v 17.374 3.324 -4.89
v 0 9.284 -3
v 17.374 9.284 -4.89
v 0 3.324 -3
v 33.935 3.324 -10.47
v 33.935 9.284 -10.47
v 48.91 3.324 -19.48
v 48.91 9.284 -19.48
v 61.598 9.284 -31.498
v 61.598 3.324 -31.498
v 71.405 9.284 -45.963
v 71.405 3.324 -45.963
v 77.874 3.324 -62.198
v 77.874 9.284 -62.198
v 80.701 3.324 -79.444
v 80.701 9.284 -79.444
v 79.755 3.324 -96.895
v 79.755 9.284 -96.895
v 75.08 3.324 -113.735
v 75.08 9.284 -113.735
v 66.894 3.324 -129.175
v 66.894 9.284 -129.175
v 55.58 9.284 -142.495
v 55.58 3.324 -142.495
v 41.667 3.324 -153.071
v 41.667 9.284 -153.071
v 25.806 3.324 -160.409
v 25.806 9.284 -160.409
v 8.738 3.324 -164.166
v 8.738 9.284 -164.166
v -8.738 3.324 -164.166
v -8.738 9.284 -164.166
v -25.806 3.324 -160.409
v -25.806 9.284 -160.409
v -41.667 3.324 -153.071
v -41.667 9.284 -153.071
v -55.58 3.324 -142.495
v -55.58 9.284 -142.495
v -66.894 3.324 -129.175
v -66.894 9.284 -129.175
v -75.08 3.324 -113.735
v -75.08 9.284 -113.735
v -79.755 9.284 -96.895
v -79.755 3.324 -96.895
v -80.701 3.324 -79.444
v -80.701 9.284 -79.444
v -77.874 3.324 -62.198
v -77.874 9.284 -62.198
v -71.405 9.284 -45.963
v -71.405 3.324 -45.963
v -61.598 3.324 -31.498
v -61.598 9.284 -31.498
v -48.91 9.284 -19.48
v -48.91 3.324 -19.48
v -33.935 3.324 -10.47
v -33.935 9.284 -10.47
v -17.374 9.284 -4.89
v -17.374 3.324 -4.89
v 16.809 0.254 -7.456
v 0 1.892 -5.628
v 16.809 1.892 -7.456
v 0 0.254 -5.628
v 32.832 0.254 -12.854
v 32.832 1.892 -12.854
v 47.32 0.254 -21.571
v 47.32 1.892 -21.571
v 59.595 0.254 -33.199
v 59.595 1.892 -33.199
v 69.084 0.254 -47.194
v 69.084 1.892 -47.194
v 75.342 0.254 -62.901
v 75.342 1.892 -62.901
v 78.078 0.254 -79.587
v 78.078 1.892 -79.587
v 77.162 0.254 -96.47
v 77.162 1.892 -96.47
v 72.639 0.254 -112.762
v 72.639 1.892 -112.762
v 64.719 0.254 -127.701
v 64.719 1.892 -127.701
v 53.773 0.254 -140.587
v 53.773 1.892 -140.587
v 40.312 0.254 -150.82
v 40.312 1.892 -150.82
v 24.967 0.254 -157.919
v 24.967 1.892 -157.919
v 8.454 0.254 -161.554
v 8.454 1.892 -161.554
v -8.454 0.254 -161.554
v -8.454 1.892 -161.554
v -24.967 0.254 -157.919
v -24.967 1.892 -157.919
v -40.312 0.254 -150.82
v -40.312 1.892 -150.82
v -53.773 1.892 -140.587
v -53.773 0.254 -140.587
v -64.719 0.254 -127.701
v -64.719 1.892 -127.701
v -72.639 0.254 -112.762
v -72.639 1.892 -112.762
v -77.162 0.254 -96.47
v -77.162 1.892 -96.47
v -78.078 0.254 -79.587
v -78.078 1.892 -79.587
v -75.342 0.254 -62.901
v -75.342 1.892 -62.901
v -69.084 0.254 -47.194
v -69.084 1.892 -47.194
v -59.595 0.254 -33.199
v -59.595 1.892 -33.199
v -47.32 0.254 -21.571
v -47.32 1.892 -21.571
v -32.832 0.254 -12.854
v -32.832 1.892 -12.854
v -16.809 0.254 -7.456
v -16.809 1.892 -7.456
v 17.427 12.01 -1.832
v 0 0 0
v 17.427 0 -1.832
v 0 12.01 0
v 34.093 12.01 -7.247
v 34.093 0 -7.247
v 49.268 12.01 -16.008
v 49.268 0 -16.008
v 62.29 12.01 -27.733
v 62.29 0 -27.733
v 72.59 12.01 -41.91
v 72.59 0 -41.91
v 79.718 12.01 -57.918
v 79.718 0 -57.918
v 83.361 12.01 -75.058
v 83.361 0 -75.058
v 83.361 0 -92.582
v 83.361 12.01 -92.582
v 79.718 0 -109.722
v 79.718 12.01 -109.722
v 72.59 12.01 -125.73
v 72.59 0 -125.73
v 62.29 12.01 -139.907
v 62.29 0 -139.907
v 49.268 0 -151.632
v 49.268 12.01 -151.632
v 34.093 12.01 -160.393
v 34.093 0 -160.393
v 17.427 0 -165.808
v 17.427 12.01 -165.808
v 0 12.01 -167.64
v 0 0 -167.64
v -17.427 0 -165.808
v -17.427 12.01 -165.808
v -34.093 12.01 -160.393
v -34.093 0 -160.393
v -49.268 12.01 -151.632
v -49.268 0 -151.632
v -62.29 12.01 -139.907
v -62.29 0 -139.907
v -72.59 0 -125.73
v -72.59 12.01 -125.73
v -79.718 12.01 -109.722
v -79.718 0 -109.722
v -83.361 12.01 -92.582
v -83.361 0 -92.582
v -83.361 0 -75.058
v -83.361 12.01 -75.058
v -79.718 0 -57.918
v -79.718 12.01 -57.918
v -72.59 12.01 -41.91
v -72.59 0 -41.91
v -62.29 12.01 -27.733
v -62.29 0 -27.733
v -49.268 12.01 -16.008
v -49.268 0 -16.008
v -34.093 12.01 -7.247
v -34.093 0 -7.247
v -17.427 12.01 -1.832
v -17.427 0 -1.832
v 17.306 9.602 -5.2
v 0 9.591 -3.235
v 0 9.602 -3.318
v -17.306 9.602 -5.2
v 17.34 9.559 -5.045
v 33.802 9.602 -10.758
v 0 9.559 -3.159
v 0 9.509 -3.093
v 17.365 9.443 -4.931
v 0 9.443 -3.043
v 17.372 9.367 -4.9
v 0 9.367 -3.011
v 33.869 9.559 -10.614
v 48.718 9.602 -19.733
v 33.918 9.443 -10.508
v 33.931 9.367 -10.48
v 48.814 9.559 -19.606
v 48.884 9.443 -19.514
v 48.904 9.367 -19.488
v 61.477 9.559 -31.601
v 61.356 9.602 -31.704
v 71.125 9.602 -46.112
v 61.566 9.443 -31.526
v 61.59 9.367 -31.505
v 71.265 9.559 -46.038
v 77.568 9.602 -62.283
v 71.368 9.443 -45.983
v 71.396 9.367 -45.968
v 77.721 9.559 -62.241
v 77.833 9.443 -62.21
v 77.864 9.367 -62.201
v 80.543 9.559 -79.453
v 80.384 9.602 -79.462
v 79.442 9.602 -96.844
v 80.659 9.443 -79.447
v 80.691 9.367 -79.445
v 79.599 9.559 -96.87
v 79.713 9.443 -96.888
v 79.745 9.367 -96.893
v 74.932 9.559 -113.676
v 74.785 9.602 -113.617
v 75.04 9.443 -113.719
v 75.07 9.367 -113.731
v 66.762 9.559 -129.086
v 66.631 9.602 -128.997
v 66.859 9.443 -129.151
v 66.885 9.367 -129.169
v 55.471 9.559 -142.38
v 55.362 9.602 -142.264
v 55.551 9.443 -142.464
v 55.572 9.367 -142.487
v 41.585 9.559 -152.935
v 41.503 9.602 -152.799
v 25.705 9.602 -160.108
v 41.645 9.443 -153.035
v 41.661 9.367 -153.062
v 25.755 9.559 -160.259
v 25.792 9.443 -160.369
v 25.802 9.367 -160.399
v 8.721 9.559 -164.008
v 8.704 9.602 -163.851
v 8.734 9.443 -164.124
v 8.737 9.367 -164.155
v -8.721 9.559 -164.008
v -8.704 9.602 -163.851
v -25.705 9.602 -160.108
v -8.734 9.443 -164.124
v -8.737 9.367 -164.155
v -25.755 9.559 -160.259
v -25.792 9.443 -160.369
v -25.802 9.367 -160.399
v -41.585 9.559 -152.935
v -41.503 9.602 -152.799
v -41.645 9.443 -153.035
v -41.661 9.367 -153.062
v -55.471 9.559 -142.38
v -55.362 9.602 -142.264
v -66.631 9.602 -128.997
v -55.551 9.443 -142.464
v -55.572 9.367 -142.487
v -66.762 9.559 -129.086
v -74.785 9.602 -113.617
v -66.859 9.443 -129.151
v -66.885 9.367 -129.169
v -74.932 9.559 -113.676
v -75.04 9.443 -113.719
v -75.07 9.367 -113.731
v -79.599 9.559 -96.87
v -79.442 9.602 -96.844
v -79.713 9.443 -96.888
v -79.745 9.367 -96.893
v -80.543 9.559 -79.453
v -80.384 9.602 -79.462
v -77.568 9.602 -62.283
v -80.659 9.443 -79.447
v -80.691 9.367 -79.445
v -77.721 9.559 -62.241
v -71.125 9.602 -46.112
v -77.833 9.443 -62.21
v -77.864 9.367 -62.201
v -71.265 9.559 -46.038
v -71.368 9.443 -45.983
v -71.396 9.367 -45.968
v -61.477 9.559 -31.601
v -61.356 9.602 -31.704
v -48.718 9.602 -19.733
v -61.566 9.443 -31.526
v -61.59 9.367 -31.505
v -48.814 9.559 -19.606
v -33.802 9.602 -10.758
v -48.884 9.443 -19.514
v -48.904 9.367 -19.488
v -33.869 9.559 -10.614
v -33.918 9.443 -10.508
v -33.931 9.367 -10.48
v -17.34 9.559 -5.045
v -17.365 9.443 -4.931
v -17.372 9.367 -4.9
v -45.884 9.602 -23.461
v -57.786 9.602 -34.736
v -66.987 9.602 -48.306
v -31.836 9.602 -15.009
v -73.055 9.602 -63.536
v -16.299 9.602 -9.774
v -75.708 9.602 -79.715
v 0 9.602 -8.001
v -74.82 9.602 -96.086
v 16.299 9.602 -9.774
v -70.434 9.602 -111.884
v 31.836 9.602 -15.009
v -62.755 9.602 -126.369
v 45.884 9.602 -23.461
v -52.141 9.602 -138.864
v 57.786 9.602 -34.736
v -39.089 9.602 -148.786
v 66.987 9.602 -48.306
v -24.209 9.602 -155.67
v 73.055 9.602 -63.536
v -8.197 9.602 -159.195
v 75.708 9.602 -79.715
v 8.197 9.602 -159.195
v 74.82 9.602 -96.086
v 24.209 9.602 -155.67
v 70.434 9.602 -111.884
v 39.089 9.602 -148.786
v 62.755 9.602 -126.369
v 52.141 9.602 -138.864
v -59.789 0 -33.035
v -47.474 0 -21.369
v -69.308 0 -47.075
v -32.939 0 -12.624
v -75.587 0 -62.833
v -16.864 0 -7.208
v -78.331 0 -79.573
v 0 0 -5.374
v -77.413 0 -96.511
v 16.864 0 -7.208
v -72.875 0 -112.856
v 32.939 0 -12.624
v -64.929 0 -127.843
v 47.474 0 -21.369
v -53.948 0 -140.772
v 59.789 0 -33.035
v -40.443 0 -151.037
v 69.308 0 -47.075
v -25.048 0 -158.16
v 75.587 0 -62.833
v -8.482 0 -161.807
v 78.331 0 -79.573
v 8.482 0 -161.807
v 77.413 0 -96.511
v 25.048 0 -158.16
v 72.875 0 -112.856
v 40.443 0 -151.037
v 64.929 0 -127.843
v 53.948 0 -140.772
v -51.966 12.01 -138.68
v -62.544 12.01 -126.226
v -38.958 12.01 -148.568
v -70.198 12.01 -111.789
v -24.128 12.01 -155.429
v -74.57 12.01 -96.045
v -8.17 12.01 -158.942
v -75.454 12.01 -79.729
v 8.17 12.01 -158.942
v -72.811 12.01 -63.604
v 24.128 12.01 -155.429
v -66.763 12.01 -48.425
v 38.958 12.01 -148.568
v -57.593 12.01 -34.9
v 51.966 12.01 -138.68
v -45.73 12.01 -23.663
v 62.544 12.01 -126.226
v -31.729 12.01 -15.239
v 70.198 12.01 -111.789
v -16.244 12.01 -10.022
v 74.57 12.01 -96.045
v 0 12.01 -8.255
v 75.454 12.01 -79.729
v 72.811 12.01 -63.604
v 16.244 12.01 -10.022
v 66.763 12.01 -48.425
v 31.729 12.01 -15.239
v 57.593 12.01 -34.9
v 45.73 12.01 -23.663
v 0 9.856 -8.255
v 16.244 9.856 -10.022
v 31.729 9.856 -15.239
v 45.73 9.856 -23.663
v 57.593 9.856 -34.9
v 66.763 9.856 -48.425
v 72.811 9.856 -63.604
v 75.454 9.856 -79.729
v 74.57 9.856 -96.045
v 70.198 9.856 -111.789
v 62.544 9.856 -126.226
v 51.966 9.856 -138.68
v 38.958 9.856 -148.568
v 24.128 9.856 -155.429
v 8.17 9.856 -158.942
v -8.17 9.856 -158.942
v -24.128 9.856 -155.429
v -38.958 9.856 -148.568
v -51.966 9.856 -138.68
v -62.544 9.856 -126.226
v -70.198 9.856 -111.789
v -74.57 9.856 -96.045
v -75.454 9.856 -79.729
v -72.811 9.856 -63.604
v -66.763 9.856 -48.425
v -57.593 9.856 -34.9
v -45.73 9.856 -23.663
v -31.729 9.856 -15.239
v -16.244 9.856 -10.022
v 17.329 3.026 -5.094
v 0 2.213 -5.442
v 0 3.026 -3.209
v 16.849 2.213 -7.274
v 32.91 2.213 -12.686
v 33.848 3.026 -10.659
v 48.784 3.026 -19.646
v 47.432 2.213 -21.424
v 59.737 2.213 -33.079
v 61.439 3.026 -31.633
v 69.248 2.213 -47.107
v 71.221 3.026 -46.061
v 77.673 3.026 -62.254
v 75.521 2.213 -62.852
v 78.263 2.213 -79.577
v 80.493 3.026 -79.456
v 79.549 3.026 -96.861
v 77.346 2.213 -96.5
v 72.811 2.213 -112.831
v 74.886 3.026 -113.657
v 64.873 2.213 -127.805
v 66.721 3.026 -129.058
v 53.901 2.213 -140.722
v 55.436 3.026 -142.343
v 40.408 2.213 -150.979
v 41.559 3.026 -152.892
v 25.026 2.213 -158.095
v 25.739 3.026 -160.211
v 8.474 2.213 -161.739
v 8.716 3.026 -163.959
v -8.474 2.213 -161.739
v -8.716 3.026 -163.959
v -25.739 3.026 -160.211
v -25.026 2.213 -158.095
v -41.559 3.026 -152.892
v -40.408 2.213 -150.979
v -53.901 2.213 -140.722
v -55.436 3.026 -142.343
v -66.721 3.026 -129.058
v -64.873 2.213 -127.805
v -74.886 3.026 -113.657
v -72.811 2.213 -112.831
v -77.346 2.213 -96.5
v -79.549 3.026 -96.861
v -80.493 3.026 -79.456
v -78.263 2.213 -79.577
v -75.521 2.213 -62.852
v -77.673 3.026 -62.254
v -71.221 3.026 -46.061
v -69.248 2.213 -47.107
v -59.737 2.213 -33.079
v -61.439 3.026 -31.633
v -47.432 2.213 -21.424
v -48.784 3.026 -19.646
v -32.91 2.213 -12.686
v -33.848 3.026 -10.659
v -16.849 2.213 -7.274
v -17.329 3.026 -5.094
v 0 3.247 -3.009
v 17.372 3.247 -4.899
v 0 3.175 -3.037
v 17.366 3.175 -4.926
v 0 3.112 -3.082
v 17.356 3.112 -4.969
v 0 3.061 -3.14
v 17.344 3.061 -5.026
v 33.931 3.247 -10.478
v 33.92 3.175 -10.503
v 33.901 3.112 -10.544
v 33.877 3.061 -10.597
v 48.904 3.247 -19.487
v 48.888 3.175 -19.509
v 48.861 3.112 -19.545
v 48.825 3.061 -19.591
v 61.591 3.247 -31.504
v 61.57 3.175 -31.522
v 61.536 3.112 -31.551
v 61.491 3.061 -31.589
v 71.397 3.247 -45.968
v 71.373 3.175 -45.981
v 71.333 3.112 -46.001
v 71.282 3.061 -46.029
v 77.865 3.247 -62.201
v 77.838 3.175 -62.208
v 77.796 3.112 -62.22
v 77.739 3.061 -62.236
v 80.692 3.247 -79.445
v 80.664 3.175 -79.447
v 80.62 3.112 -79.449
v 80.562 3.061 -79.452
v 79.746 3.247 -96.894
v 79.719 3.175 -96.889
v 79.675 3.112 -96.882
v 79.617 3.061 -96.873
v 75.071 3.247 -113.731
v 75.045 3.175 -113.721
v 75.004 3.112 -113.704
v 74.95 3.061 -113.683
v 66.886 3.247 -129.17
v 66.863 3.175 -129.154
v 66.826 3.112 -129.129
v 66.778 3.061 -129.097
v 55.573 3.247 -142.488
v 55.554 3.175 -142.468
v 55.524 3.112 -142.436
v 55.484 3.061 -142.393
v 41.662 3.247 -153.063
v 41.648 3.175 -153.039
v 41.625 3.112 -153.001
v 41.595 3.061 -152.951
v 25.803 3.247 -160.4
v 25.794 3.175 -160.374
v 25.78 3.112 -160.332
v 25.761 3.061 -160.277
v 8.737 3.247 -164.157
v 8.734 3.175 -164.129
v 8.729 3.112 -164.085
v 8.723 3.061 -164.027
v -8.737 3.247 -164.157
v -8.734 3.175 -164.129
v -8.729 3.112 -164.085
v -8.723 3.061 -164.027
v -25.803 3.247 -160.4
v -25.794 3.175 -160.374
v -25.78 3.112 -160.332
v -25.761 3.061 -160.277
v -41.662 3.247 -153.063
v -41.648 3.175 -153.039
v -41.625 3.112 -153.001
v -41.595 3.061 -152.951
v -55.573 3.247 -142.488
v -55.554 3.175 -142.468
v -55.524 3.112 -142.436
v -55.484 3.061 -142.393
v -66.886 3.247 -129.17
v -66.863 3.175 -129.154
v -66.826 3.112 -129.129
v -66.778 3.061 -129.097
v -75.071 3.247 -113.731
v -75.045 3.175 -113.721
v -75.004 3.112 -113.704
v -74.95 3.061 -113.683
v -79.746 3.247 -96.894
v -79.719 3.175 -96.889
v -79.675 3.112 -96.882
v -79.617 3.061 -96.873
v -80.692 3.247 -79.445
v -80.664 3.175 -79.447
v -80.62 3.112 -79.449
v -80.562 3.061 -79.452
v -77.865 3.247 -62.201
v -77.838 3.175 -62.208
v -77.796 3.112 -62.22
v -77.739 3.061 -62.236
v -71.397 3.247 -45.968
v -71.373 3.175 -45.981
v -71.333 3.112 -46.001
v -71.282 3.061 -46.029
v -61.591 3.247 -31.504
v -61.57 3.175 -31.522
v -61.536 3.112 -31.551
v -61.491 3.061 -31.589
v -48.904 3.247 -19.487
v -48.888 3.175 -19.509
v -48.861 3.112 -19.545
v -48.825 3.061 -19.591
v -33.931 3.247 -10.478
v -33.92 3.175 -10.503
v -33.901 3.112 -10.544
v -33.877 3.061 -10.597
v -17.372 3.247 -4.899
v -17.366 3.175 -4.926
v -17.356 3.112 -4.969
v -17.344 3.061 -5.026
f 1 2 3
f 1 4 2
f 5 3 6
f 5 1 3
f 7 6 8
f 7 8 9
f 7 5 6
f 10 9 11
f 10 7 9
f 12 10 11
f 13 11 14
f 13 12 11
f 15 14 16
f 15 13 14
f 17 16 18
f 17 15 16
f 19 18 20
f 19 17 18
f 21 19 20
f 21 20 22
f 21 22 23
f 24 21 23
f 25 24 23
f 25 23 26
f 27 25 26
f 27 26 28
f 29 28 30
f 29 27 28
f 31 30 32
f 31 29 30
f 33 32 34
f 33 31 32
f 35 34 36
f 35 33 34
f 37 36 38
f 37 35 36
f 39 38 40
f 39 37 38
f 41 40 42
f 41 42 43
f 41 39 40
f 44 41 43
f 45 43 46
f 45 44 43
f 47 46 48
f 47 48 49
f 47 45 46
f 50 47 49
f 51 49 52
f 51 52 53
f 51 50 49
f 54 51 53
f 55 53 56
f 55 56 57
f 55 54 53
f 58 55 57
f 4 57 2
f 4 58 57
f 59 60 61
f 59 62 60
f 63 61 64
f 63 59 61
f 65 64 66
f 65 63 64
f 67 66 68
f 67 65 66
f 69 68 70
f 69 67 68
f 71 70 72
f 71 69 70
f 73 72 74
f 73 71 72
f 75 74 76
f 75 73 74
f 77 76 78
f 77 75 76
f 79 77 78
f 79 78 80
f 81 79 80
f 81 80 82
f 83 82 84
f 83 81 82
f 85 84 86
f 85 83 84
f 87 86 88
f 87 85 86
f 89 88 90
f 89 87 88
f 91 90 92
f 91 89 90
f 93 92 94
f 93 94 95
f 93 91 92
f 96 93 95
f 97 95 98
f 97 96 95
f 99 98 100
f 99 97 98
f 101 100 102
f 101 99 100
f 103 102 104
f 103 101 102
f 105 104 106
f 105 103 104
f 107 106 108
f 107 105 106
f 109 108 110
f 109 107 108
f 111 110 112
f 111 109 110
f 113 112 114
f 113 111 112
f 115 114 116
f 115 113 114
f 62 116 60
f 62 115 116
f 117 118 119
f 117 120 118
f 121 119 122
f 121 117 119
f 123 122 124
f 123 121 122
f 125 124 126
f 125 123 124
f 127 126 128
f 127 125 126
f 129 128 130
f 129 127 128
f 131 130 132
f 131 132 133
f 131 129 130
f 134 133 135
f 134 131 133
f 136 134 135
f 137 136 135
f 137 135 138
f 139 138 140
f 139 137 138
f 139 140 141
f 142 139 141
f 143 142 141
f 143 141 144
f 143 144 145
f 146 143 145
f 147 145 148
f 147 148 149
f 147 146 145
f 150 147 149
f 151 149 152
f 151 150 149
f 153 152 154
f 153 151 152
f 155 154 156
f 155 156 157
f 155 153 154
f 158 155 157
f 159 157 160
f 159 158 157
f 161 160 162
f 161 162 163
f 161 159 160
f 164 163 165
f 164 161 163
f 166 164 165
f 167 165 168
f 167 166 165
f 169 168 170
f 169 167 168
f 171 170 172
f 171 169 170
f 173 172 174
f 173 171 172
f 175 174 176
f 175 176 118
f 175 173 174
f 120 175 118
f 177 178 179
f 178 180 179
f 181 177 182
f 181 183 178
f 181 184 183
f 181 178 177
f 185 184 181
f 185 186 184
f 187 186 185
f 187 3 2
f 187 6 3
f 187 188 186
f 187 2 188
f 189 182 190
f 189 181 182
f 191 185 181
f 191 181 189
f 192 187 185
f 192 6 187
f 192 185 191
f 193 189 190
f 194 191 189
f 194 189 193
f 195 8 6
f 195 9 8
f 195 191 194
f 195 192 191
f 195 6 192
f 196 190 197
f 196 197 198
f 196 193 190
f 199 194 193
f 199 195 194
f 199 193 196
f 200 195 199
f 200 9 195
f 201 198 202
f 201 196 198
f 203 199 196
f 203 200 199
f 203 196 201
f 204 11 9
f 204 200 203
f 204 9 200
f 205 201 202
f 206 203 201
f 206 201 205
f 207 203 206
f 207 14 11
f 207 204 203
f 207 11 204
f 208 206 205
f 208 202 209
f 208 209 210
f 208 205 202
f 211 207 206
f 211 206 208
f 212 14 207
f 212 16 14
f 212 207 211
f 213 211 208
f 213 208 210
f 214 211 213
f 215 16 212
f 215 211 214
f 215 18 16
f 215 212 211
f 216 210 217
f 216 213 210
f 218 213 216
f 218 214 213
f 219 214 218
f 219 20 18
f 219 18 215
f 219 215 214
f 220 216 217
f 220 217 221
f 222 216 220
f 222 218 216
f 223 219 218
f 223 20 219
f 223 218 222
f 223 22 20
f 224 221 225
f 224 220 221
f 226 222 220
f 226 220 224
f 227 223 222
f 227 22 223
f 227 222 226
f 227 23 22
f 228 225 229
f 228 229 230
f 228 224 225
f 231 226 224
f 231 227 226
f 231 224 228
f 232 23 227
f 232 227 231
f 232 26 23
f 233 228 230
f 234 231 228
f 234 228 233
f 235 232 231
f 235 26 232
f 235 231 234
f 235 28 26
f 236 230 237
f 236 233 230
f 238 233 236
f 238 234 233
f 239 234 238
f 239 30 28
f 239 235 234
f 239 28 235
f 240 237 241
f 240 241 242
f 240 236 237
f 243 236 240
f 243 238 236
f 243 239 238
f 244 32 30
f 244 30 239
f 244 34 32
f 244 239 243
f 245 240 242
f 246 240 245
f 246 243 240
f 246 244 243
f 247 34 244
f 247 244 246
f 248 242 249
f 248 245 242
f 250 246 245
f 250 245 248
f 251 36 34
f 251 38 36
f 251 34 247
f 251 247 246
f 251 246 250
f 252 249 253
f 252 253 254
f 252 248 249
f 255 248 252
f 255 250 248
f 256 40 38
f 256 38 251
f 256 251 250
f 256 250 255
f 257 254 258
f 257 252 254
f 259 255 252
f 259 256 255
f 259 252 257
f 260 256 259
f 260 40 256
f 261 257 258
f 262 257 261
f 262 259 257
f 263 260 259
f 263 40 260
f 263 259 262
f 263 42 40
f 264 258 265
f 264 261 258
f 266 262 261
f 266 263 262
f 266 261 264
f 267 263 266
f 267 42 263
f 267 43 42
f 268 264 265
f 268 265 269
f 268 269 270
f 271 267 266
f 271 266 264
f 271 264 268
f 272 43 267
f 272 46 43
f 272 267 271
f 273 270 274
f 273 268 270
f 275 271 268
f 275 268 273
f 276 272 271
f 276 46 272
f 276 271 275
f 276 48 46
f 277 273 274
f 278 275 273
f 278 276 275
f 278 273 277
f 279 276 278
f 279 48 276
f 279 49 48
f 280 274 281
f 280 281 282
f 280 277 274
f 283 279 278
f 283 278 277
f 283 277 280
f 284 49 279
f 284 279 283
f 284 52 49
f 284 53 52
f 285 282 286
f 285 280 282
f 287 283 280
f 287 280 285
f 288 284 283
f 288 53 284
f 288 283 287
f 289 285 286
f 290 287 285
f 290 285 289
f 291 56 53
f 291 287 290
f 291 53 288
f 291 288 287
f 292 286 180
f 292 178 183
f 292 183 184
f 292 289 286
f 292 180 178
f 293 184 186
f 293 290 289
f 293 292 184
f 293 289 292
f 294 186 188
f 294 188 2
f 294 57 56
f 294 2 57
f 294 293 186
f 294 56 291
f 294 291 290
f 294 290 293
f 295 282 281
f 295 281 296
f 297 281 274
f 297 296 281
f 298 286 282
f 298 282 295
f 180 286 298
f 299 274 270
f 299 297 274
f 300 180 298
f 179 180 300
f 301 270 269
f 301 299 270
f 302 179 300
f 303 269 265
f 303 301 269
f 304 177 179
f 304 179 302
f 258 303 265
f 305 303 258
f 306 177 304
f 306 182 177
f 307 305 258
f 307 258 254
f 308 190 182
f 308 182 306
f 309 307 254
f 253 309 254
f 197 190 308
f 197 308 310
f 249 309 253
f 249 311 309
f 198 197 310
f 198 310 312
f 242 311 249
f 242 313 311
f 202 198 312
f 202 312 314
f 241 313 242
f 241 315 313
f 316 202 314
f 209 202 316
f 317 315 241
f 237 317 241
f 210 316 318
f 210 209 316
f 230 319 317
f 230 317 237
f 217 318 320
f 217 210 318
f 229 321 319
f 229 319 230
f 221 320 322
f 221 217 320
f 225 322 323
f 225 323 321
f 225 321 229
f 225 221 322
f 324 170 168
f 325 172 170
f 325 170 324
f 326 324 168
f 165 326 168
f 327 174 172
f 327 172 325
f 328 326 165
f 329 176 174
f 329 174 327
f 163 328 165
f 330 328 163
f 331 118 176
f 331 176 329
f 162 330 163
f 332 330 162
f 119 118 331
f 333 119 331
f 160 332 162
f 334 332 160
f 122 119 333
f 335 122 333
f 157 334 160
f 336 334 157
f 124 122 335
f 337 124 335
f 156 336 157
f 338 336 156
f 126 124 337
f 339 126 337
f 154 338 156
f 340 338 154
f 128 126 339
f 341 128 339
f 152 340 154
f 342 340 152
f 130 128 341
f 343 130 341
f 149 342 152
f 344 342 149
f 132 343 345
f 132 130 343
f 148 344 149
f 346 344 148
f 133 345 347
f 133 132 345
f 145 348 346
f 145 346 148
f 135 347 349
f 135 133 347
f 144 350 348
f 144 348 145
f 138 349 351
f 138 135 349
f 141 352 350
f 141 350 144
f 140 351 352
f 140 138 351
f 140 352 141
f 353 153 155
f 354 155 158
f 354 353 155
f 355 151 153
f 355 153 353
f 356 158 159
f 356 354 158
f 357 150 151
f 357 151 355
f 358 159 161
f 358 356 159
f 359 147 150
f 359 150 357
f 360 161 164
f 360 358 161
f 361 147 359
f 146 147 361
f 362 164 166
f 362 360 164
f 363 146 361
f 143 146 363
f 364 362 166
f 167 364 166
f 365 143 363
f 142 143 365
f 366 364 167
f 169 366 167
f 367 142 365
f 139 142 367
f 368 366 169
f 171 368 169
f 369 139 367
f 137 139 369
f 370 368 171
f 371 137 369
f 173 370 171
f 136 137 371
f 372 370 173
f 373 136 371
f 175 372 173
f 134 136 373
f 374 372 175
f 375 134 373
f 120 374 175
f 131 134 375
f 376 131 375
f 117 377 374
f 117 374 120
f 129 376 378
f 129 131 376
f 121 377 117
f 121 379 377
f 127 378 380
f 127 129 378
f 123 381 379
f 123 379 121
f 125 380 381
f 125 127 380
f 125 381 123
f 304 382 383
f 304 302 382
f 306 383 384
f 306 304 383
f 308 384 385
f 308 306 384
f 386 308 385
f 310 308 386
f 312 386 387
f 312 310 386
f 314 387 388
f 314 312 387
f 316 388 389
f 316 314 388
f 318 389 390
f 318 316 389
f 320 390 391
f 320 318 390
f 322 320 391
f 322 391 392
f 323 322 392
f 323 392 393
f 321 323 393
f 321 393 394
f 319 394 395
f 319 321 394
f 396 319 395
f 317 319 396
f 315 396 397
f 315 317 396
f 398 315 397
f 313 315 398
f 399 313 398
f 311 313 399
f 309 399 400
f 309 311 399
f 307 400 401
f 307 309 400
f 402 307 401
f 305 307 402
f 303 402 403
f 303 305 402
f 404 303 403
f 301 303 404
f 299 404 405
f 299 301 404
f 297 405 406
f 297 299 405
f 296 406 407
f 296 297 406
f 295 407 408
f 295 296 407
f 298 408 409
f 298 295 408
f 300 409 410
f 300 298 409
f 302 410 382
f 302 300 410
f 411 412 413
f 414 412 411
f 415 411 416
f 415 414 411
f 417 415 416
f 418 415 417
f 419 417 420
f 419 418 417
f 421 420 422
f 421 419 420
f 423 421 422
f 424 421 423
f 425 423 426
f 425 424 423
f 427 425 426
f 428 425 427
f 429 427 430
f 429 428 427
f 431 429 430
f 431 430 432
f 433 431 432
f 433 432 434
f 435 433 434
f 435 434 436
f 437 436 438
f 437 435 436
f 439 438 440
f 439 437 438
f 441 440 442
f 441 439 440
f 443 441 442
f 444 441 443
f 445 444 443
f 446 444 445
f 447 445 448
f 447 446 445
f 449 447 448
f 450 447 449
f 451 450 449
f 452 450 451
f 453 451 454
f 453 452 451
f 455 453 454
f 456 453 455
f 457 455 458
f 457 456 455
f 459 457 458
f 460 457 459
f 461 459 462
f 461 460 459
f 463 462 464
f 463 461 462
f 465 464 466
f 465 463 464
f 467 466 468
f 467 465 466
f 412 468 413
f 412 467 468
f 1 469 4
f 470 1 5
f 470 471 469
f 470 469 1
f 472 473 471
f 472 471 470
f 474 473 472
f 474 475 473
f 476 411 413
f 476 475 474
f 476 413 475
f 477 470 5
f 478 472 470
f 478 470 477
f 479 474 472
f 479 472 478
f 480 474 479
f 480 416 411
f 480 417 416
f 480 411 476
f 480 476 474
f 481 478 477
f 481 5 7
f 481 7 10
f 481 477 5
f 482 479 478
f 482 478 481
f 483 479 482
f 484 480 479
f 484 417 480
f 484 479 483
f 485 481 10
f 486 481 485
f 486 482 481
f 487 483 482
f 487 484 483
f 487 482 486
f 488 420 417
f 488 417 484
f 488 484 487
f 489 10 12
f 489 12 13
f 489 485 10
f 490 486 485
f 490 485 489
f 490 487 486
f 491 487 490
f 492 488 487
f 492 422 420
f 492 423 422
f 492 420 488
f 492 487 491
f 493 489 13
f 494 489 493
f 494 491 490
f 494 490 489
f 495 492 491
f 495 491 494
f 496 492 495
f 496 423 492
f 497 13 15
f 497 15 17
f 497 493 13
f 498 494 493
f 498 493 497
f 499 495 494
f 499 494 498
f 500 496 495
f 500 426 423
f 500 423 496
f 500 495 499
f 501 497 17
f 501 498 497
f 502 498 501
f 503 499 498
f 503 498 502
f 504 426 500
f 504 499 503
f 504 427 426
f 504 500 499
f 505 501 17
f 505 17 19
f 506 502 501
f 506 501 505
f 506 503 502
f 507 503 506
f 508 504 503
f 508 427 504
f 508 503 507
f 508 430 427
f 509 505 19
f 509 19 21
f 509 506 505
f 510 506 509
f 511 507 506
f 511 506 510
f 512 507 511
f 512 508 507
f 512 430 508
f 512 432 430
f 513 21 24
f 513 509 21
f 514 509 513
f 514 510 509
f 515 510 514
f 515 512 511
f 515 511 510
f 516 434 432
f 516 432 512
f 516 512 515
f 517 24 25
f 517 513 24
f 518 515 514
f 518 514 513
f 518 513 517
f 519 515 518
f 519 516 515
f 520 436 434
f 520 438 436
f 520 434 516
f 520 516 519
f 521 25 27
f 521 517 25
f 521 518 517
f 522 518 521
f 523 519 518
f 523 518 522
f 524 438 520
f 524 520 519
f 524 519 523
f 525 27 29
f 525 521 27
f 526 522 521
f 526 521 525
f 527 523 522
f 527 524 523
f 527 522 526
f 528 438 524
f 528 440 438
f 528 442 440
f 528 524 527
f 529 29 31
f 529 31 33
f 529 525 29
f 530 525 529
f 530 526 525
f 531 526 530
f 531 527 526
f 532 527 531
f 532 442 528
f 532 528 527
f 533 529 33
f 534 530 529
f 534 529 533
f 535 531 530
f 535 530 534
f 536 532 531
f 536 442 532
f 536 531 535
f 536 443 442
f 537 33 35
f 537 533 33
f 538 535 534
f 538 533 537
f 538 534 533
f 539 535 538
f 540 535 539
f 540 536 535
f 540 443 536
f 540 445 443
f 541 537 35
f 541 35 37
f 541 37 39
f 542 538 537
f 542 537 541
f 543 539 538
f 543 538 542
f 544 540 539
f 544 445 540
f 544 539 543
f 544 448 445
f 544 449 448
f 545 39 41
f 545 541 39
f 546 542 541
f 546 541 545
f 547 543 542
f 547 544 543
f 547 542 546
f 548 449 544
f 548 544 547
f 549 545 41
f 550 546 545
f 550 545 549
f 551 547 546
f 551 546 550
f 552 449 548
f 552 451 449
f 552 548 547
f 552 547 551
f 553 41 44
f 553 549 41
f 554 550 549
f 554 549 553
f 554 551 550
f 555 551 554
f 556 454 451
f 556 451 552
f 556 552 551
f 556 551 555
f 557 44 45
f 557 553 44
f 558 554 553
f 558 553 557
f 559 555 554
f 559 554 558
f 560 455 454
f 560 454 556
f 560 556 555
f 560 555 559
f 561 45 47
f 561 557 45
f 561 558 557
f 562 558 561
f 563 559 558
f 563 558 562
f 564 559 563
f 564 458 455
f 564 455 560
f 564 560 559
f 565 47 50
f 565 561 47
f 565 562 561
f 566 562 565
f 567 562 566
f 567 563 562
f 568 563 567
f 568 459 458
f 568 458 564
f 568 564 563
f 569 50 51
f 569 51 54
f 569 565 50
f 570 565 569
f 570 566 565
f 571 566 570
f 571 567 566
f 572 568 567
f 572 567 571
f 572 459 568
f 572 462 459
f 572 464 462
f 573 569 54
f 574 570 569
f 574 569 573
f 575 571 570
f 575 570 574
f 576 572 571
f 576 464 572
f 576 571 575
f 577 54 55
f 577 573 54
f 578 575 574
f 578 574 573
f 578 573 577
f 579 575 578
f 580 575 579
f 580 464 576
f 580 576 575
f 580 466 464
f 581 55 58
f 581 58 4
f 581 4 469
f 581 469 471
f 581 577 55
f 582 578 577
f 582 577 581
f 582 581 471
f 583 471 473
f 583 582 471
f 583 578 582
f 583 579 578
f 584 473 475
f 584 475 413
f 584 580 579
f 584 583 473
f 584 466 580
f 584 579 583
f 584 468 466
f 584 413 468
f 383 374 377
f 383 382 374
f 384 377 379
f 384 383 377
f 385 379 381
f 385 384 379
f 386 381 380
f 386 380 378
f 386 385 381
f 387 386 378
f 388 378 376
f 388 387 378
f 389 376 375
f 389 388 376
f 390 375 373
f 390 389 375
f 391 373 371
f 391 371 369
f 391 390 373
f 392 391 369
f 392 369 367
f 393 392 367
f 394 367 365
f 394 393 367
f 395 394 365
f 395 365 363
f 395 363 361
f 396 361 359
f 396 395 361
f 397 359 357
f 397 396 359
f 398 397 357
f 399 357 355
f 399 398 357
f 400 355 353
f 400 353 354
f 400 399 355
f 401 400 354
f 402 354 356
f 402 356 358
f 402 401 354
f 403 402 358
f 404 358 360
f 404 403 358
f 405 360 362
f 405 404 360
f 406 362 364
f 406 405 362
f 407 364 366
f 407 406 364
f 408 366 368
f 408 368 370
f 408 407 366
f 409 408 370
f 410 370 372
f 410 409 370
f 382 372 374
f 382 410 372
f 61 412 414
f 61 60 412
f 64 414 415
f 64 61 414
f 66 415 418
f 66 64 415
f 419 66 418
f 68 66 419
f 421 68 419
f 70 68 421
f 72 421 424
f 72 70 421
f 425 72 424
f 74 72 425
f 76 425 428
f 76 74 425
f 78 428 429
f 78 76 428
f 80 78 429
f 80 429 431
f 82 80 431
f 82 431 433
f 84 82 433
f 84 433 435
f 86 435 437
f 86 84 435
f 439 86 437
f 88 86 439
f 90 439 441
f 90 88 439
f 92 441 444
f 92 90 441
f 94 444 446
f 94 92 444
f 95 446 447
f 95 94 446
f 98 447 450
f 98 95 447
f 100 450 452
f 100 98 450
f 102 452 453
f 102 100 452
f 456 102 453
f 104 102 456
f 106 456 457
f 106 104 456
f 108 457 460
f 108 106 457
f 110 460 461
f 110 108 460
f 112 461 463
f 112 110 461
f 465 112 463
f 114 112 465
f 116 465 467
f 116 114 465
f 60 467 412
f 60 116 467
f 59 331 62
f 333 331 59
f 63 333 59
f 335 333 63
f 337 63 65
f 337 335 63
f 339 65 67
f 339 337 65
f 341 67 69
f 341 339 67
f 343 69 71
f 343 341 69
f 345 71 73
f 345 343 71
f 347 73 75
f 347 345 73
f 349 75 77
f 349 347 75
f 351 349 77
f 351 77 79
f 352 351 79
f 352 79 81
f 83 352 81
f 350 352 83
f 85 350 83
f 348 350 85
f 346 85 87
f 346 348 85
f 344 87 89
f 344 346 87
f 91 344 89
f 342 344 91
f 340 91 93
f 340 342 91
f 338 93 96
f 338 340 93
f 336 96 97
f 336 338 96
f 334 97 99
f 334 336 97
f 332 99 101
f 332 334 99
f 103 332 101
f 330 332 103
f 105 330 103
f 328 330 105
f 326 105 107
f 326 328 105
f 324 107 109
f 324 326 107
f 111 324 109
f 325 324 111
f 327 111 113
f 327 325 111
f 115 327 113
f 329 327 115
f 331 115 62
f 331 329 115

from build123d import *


with BuildPart() as part:
    # Sketch1 → Revolve3 (revolve)
    with BuildSketch(Plane(origin=(0, 0, 0), x_dir=(0, 0, -1), z_dir=(1, 0, 0))):
        with BuildLine():
            Line((8.255, 9.855919884), (8.001, 9.601919884))
            Line((8.001, 9.601919884), (3.3175, 9.601919884))
            ThreePointArc((3.3175, 9.601919884), (3.092993597, 9.508926287), (3, 9.284419884))
            Line((3, 9.284419884), (3, 3.324235778))
            ThreePointArc((3, 3.324235778), (3.057419226, 3.142125259), (3.208908604, 3.025883371))
            Line((3.208908604, 3.025883371), (5.441838421, 2.213163382))
            Line((5.441838421, 2.213163382), (5.6275, 1.891588094))
            Line((5.6275, 1.891588094), (5.6275, 0.254))
            Line((5.6275, 0.254), (5.3735, 0))
            Line((5.3735, 0), (0, 0))
            Line((0, 0), (0, 12.009719884))
            Line((0, 12.009719884), (8.255, 12.009719884))
            Line((8.255, 12.009719884), (8.255, 9.855919884))
        make_face()
    revolve(axis=Axis((0, 6.004859942, -83.82), (0, 1, 0)))


solid = part.part
